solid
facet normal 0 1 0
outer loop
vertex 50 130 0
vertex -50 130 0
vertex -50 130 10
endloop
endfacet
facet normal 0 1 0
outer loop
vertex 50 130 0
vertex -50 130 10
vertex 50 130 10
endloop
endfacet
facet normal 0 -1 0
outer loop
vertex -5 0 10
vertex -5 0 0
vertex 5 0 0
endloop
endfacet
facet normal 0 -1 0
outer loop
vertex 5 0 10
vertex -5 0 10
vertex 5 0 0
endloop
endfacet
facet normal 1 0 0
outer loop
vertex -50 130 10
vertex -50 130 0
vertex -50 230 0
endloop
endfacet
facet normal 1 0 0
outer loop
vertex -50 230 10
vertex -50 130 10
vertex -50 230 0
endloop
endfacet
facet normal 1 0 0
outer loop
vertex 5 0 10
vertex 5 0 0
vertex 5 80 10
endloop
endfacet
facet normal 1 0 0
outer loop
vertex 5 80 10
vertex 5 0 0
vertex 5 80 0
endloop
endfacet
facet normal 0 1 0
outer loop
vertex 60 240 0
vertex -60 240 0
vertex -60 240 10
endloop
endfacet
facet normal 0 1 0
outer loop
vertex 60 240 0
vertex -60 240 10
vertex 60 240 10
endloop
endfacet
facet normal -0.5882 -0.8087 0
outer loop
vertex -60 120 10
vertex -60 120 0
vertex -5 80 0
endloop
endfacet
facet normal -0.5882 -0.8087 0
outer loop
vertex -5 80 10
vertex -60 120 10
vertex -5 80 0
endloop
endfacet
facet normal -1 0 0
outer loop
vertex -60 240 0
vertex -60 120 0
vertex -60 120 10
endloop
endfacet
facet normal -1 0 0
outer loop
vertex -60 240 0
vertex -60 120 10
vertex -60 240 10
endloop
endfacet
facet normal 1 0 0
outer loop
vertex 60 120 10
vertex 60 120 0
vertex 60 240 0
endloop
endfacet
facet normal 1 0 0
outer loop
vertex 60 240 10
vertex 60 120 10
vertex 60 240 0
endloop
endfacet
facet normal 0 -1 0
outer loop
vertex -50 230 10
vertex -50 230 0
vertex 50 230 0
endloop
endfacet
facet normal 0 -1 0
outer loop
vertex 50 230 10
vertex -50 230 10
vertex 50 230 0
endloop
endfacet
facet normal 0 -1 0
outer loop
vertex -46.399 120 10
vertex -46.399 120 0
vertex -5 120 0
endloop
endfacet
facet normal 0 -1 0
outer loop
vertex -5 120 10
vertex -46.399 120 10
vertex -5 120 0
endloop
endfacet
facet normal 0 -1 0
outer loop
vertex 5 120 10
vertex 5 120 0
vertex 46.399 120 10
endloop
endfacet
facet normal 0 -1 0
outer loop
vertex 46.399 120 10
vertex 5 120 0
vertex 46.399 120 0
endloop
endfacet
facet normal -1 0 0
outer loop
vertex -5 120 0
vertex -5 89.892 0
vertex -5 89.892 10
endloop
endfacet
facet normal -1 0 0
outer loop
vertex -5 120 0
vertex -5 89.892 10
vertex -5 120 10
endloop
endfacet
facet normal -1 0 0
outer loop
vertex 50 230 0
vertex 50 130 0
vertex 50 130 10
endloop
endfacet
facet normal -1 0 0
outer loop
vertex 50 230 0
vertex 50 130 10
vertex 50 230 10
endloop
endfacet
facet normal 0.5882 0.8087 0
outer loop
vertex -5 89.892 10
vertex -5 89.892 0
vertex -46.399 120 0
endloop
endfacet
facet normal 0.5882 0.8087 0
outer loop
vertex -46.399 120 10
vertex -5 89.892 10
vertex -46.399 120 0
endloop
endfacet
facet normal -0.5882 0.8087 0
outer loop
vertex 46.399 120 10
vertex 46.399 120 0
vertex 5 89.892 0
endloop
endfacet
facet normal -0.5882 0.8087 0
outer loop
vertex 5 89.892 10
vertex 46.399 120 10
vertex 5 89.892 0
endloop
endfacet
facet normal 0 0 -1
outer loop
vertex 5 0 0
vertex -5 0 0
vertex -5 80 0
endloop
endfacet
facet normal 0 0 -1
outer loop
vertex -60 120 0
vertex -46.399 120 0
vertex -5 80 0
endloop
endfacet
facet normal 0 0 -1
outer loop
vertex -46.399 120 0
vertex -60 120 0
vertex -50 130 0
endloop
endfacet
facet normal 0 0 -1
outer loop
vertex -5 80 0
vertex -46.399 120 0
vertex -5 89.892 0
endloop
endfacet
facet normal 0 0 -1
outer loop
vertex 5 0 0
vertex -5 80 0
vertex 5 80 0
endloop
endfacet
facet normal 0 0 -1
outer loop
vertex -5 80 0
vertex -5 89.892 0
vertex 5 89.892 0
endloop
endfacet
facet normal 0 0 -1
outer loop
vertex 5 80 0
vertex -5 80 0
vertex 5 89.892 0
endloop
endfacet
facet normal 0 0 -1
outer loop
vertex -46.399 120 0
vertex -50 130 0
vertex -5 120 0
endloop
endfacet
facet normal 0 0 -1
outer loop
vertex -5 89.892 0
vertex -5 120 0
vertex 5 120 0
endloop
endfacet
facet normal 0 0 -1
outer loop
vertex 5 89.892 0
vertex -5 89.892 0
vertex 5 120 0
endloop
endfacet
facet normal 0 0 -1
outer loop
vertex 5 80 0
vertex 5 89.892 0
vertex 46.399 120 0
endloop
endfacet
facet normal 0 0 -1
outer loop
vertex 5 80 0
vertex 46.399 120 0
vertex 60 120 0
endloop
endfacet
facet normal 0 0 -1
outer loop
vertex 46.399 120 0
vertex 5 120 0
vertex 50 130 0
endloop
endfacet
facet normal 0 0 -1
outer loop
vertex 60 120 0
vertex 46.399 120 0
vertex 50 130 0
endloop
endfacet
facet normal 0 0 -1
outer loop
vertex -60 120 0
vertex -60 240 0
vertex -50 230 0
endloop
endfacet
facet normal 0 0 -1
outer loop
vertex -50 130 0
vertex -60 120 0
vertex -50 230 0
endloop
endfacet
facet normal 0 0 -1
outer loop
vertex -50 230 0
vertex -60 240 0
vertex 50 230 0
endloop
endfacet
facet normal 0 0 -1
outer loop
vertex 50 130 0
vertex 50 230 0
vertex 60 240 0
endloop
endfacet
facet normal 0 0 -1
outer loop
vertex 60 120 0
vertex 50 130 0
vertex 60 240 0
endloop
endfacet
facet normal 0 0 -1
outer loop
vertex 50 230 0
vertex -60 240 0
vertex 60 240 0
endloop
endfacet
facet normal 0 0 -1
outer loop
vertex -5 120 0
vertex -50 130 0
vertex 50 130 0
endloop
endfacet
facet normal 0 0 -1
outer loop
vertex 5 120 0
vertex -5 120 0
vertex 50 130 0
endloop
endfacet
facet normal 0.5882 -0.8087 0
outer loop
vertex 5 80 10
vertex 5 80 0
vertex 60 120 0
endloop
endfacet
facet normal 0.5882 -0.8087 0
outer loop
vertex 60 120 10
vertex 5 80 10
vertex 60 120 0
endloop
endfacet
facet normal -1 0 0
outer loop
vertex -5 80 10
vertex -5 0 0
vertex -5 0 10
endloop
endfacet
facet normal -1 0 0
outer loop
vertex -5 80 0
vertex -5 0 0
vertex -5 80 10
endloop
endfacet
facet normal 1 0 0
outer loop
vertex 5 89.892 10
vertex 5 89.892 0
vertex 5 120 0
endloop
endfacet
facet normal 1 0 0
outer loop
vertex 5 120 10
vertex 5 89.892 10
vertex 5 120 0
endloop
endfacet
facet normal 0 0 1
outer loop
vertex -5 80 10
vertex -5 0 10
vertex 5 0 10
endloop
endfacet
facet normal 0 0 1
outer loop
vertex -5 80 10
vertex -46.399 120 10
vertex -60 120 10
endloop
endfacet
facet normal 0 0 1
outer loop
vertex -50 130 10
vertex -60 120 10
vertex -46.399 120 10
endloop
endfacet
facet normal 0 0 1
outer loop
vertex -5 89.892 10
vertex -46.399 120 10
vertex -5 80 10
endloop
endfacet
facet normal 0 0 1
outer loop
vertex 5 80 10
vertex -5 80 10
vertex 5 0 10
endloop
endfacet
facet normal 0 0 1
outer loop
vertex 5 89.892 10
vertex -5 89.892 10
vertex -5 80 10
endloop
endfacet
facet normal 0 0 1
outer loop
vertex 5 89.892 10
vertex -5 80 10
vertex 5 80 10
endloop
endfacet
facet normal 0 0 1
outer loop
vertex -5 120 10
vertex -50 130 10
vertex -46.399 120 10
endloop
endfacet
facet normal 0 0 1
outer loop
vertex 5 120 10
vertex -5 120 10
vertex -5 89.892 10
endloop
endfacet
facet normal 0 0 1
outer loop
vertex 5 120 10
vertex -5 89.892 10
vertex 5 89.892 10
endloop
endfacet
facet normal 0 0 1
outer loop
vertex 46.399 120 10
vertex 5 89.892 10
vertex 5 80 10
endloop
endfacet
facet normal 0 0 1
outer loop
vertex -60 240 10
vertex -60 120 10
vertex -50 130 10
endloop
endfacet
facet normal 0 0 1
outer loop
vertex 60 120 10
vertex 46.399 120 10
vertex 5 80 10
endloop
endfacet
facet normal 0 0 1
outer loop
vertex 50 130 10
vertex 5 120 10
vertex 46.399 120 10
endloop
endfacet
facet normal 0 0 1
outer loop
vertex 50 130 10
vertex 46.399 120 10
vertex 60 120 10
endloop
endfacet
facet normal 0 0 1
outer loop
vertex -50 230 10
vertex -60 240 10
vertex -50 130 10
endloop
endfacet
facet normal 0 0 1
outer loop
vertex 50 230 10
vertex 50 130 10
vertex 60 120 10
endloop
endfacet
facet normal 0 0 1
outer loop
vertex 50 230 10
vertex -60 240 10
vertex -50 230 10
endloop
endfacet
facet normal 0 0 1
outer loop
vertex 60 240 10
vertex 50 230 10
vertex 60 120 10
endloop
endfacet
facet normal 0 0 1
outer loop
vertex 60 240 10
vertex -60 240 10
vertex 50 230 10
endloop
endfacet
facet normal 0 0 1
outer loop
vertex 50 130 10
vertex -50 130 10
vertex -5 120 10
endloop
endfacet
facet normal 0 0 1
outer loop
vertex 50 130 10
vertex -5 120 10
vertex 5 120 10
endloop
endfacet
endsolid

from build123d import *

# Parameters (mm, degrees)
F3_W      = 10
F3_H      = 120
F4_DEPTH  = 10
F7_W      = 120
F7_H      = 10
F8_DEPTH  = 10
F9_W      = 10
F9_H      = 100
F10_DEPTH = 10
F11_W     = 120
F11_H     = 10
F12_DEPTH = 10
F14_DEPTH = 10


with BuildPart() as f4:
    # F3 (on Top) → F4 (new body)
    with BuildSketch(Plane.XY):
        with Locations((0, 60)):
            Rectangle(F3_W, F3_H)
    extrude(amount=F4_DEPTH)

    # F7 (on Top) → F8 (join)
    with BuildSketch(Plane.XY):
        with Locations((0, 125)):
            Rectangle(F7_W, F7_H)
    extrude(amount=F8_DEPTH)

    # F9 (on Top) → F10 (join)
    with BuildSketch(Plane.XY):
        with Locations((-55, 180)):
            Rectangle(F9_W, F9_H)
        with Locations((55, 180)):
            Rectangle(F9_W, F9_H)
    extrude(amount=F10_DEPTH)

    # F11 (on Top) → F12 (join)
    with BuildSketch(Plane.XY):
        with Locations((0, 235)):
            Rectangle(F11_W, F11_H)
    extrude(amount=F12_DEPTH)

    # F13 (on Top) → F14 (join)
    with BuildSketch(Plane.XY):
        Polygon((-5, 80), (-5, 89.891979), (-46.398529, 120), (-60, 120), align=None)
        Polygon((5, 80), (60, 120), (46.398529, 120), (5, 89.891979), align=None)
    extrude(amount=F14_DEPTH)


solid = f4.part
